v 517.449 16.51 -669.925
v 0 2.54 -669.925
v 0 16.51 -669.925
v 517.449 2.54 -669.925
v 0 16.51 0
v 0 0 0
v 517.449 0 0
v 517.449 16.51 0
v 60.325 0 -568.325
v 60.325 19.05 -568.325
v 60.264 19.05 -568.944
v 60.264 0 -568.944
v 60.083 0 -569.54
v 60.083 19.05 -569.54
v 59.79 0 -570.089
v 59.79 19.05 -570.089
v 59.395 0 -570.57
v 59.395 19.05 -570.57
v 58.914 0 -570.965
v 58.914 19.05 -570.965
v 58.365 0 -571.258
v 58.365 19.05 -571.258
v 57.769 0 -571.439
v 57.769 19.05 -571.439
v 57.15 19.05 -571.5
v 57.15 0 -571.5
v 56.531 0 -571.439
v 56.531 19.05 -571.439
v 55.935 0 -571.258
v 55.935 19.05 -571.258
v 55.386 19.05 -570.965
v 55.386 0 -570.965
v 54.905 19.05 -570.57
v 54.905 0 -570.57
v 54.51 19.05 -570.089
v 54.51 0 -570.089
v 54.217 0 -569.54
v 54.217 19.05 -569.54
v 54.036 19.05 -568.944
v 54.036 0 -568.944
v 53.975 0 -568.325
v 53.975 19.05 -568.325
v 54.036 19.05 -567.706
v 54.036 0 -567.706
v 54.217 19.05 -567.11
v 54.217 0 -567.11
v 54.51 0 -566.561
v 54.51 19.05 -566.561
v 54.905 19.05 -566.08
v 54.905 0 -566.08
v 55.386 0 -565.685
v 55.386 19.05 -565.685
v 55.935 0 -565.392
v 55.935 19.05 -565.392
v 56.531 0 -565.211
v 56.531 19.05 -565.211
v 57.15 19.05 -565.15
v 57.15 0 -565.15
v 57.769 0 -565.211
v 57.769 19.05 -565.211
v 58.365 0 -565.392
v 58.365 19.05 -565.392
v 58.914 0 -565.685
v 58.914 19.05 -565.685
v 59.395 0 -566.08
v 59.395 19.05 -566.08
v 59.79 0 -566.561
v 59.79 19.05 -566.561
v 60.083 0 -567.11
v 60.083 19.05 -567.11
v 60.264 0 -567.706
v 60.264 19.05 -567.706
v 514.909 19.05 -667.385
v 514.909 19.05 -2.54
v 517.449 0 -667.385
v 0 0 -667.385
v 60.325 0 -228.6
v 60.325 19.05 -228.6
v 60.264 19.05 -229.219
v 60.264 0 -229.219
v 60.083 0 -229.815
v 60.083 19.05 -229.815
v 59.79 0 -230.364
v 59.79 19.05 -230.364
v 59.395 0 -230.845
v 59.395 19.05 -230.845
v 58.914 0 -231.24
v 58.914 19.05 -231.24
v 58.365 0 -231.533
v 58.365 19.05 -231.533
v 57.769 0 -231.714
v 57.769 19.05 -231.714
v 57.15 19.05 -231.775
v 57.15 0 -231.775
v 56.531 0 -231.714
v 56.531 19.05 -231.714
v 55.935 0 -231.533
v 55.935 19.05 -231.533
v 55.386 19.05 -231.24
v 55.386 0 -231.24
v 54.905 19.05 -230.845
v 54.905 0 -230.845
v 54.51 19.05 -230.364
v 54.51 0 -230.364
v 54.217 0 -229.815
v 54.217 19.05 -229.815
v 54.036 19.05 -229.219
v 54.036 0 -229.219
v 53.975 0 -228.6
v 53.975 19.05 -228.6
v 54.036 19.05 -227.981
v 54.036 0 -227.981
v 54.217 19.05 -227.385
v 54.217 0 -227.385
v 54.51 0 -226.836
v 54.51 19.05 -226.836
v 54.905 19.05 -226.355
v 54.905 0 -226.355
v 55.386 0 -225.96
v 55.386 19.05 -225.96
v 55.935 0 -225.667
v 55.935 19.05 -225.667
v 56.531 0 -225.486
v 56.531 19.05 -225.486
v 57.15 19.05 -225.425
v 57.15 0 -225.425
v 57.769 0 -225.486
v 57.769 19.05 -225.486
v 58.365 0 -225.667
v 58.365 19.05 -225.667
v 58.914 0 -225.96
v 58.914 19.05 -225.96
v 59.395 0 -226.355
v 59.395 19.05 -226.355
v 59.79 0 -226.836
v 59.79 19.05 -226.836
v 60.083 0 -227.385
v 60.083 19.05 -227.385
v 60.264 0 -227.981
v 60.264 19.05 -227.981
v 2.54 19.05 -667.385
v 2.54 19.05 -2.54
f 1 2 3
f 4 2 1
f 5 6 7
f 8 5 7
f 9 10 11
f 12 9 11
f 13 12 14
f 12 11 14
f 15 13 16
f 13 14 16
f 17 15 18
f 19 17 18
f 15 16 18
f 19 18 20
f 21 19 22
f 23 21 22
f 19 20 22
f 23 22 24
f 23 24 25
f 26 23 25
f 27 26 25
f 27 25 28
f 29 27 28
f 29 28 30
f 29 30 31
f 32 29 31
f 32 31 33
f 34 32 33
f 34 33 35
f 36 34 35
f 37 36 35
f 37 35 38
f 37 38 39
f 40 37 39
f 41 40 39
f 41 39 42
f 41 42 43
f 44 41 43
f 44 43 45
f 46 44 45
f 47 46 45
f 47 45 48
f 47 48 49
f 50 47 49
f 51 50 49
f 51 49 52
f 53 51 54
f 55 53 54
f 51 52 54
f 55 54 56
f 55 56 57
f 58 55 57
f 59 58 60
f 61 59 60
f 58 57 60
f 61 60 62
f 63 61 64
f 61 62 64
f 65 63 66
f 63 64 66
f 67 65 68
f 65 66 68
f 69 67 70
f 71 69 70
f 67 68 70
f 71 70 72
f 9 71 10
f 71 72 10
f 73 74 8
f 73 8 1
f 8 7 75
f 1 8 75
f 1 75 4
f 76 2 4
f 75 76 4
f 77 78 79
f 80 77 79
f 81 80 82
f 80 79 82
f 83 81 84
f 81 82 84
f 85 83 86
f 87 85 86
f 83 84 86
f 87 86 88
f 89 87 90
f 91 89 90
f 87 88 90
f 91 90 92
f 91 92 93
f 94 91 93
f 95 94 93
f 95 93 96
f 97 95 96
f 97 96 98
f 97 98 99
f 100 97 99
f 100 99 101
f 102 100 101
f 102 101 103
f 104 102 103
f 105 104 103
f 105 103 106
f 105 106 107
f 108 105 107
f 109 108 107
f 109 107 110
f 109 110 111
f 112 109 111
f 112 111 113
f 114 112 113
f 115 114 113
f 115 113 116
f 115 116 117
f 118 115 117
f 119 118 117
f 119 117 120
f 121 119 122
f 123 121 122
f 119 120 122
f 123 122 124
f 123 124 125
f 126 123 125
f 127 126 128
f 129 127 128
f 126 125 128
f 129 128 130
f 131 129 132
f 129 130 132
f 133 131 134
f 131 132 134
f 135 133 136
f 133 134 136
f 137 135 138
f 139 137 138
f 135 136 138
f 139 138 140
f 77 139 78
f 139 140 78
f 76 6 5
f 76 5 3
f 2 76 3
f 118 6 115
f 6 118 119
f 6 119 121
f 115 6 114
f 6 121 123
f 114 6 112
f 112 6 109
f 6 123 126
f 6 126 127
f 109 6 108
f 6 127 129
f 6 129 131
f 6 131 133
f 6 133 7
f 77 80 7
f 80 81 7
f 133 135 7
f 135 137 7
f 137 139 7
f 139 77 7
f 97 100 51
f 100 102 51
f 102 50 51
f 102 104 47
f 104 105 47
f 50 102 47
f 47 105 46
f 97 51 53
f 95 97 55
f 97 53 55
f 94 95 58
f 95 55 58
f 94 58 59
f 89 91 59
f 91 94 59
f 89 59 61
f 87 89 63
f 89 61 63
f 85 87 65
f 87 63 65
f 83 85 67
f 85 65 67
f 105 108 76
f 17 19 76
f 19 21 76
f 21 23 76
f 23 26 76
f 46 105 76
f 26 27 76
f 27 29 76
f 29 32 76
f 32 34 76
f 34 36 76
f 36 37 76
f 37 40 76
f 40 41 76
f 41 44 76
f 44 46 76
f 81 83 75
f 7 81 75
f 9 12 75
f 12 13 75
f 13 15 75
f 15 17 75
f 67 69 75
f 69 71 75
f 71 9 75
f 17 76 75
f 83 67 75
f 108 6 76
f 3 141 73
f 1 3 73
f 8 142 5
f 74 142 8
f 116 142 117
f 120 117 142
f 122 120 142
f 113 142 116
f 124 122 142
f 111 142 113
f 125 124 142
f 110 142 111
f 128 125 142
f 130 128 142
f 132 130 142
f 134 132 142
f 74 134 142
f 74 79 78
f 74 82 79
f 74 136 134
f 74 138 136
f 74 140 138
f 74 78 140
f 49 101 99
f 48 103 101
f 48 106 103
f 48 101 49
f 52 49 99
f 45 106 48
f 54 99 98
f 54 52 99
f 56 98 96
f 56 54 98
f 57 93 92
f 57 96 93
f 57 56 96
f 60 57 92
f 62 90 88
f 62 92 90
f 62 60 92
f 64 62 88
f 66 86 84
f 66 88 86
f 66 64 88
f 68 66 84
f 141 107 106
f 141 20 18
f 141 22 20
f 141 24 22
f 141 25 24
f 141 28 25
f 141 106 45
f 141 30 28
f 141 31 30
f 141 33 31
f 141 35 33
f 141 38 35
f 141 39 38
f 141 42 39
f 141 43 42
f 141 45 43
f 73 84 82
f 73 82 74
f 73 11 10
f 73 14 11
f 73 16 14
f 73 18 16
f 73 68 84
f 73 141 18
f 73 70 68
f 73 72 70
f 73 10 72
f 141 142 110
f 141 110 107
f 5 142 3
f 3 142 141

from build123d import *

# Parameters (mm, degrees)
SKETCH1_W           = 517.4488
SKETCH1_H           = 669.925
BOSS_EXTRUDE1_DEPTH = 19.05
CHAMFER1_SIZE       = 2.54
CHAMFER2_SIZE       = 2.54
SKETCH2_R           = 3.175
CUT_EXTRUDE1_DEPTH  = 20.05


with BuildPart() as part:
    # Sketch1 → Boss-Extrude1 (new body)
    with BuildSketch(Plane(origin=(0, 0, 0), x_dir=(1, 0, 0), z_dir=(0, 1, 0))):
        with Locations((258.7244, 334.9625)):
            Rectangle(SKETCH1_W, SKETCH1_H)
    extrude(amount=BOSS_EXTRUDE1_DEPTH)

    # Chamfer1
    chamfer1_edges = [part.edges().sort_by_distance(p)[0] for p in [
        (517.4488, 19.05, -334.9625),
        (258.7244, 19.05, -669.925),
        (0, 19.05, -334.9625),
        (258.7244, 19.05, 0),
    ]]
    chamfer(chamfer1_edges, length=CHAMFER1_SIZE)

    # Chamfer2
    chamfer2_edges = [part.edges().sort_by_distance(p)[0] for p in [
        (258.7244, 0, -669.925),
    ]]
    chamfer(chamfer2_edges, length=CHAMFER2_SIZE)

    # Sketch2 → Cut-Extrude1 (cut, through all)
    with BuildSketch(Plane(origin=(0, 19.05, 0), x_dir=(1, 0, 0), z_dir=(0, 1, 0))):
        with Locations((57.15, 568.325)):
            Circle(SKETCH2_R)
        with Locations((57.15, 228.6)):
            Circle(SKETCH2_R)
        with Locations((666.75, 568.325)):
            Circle(SKETCH2_R)
        with Locations((666.75, 228.6)):
            Circle(SKETCH2_R)
    extrude(amount=-CUT_EXTRUDE1_DEPTH, mode=Mode.SUBTRACT)


solid = part.part
